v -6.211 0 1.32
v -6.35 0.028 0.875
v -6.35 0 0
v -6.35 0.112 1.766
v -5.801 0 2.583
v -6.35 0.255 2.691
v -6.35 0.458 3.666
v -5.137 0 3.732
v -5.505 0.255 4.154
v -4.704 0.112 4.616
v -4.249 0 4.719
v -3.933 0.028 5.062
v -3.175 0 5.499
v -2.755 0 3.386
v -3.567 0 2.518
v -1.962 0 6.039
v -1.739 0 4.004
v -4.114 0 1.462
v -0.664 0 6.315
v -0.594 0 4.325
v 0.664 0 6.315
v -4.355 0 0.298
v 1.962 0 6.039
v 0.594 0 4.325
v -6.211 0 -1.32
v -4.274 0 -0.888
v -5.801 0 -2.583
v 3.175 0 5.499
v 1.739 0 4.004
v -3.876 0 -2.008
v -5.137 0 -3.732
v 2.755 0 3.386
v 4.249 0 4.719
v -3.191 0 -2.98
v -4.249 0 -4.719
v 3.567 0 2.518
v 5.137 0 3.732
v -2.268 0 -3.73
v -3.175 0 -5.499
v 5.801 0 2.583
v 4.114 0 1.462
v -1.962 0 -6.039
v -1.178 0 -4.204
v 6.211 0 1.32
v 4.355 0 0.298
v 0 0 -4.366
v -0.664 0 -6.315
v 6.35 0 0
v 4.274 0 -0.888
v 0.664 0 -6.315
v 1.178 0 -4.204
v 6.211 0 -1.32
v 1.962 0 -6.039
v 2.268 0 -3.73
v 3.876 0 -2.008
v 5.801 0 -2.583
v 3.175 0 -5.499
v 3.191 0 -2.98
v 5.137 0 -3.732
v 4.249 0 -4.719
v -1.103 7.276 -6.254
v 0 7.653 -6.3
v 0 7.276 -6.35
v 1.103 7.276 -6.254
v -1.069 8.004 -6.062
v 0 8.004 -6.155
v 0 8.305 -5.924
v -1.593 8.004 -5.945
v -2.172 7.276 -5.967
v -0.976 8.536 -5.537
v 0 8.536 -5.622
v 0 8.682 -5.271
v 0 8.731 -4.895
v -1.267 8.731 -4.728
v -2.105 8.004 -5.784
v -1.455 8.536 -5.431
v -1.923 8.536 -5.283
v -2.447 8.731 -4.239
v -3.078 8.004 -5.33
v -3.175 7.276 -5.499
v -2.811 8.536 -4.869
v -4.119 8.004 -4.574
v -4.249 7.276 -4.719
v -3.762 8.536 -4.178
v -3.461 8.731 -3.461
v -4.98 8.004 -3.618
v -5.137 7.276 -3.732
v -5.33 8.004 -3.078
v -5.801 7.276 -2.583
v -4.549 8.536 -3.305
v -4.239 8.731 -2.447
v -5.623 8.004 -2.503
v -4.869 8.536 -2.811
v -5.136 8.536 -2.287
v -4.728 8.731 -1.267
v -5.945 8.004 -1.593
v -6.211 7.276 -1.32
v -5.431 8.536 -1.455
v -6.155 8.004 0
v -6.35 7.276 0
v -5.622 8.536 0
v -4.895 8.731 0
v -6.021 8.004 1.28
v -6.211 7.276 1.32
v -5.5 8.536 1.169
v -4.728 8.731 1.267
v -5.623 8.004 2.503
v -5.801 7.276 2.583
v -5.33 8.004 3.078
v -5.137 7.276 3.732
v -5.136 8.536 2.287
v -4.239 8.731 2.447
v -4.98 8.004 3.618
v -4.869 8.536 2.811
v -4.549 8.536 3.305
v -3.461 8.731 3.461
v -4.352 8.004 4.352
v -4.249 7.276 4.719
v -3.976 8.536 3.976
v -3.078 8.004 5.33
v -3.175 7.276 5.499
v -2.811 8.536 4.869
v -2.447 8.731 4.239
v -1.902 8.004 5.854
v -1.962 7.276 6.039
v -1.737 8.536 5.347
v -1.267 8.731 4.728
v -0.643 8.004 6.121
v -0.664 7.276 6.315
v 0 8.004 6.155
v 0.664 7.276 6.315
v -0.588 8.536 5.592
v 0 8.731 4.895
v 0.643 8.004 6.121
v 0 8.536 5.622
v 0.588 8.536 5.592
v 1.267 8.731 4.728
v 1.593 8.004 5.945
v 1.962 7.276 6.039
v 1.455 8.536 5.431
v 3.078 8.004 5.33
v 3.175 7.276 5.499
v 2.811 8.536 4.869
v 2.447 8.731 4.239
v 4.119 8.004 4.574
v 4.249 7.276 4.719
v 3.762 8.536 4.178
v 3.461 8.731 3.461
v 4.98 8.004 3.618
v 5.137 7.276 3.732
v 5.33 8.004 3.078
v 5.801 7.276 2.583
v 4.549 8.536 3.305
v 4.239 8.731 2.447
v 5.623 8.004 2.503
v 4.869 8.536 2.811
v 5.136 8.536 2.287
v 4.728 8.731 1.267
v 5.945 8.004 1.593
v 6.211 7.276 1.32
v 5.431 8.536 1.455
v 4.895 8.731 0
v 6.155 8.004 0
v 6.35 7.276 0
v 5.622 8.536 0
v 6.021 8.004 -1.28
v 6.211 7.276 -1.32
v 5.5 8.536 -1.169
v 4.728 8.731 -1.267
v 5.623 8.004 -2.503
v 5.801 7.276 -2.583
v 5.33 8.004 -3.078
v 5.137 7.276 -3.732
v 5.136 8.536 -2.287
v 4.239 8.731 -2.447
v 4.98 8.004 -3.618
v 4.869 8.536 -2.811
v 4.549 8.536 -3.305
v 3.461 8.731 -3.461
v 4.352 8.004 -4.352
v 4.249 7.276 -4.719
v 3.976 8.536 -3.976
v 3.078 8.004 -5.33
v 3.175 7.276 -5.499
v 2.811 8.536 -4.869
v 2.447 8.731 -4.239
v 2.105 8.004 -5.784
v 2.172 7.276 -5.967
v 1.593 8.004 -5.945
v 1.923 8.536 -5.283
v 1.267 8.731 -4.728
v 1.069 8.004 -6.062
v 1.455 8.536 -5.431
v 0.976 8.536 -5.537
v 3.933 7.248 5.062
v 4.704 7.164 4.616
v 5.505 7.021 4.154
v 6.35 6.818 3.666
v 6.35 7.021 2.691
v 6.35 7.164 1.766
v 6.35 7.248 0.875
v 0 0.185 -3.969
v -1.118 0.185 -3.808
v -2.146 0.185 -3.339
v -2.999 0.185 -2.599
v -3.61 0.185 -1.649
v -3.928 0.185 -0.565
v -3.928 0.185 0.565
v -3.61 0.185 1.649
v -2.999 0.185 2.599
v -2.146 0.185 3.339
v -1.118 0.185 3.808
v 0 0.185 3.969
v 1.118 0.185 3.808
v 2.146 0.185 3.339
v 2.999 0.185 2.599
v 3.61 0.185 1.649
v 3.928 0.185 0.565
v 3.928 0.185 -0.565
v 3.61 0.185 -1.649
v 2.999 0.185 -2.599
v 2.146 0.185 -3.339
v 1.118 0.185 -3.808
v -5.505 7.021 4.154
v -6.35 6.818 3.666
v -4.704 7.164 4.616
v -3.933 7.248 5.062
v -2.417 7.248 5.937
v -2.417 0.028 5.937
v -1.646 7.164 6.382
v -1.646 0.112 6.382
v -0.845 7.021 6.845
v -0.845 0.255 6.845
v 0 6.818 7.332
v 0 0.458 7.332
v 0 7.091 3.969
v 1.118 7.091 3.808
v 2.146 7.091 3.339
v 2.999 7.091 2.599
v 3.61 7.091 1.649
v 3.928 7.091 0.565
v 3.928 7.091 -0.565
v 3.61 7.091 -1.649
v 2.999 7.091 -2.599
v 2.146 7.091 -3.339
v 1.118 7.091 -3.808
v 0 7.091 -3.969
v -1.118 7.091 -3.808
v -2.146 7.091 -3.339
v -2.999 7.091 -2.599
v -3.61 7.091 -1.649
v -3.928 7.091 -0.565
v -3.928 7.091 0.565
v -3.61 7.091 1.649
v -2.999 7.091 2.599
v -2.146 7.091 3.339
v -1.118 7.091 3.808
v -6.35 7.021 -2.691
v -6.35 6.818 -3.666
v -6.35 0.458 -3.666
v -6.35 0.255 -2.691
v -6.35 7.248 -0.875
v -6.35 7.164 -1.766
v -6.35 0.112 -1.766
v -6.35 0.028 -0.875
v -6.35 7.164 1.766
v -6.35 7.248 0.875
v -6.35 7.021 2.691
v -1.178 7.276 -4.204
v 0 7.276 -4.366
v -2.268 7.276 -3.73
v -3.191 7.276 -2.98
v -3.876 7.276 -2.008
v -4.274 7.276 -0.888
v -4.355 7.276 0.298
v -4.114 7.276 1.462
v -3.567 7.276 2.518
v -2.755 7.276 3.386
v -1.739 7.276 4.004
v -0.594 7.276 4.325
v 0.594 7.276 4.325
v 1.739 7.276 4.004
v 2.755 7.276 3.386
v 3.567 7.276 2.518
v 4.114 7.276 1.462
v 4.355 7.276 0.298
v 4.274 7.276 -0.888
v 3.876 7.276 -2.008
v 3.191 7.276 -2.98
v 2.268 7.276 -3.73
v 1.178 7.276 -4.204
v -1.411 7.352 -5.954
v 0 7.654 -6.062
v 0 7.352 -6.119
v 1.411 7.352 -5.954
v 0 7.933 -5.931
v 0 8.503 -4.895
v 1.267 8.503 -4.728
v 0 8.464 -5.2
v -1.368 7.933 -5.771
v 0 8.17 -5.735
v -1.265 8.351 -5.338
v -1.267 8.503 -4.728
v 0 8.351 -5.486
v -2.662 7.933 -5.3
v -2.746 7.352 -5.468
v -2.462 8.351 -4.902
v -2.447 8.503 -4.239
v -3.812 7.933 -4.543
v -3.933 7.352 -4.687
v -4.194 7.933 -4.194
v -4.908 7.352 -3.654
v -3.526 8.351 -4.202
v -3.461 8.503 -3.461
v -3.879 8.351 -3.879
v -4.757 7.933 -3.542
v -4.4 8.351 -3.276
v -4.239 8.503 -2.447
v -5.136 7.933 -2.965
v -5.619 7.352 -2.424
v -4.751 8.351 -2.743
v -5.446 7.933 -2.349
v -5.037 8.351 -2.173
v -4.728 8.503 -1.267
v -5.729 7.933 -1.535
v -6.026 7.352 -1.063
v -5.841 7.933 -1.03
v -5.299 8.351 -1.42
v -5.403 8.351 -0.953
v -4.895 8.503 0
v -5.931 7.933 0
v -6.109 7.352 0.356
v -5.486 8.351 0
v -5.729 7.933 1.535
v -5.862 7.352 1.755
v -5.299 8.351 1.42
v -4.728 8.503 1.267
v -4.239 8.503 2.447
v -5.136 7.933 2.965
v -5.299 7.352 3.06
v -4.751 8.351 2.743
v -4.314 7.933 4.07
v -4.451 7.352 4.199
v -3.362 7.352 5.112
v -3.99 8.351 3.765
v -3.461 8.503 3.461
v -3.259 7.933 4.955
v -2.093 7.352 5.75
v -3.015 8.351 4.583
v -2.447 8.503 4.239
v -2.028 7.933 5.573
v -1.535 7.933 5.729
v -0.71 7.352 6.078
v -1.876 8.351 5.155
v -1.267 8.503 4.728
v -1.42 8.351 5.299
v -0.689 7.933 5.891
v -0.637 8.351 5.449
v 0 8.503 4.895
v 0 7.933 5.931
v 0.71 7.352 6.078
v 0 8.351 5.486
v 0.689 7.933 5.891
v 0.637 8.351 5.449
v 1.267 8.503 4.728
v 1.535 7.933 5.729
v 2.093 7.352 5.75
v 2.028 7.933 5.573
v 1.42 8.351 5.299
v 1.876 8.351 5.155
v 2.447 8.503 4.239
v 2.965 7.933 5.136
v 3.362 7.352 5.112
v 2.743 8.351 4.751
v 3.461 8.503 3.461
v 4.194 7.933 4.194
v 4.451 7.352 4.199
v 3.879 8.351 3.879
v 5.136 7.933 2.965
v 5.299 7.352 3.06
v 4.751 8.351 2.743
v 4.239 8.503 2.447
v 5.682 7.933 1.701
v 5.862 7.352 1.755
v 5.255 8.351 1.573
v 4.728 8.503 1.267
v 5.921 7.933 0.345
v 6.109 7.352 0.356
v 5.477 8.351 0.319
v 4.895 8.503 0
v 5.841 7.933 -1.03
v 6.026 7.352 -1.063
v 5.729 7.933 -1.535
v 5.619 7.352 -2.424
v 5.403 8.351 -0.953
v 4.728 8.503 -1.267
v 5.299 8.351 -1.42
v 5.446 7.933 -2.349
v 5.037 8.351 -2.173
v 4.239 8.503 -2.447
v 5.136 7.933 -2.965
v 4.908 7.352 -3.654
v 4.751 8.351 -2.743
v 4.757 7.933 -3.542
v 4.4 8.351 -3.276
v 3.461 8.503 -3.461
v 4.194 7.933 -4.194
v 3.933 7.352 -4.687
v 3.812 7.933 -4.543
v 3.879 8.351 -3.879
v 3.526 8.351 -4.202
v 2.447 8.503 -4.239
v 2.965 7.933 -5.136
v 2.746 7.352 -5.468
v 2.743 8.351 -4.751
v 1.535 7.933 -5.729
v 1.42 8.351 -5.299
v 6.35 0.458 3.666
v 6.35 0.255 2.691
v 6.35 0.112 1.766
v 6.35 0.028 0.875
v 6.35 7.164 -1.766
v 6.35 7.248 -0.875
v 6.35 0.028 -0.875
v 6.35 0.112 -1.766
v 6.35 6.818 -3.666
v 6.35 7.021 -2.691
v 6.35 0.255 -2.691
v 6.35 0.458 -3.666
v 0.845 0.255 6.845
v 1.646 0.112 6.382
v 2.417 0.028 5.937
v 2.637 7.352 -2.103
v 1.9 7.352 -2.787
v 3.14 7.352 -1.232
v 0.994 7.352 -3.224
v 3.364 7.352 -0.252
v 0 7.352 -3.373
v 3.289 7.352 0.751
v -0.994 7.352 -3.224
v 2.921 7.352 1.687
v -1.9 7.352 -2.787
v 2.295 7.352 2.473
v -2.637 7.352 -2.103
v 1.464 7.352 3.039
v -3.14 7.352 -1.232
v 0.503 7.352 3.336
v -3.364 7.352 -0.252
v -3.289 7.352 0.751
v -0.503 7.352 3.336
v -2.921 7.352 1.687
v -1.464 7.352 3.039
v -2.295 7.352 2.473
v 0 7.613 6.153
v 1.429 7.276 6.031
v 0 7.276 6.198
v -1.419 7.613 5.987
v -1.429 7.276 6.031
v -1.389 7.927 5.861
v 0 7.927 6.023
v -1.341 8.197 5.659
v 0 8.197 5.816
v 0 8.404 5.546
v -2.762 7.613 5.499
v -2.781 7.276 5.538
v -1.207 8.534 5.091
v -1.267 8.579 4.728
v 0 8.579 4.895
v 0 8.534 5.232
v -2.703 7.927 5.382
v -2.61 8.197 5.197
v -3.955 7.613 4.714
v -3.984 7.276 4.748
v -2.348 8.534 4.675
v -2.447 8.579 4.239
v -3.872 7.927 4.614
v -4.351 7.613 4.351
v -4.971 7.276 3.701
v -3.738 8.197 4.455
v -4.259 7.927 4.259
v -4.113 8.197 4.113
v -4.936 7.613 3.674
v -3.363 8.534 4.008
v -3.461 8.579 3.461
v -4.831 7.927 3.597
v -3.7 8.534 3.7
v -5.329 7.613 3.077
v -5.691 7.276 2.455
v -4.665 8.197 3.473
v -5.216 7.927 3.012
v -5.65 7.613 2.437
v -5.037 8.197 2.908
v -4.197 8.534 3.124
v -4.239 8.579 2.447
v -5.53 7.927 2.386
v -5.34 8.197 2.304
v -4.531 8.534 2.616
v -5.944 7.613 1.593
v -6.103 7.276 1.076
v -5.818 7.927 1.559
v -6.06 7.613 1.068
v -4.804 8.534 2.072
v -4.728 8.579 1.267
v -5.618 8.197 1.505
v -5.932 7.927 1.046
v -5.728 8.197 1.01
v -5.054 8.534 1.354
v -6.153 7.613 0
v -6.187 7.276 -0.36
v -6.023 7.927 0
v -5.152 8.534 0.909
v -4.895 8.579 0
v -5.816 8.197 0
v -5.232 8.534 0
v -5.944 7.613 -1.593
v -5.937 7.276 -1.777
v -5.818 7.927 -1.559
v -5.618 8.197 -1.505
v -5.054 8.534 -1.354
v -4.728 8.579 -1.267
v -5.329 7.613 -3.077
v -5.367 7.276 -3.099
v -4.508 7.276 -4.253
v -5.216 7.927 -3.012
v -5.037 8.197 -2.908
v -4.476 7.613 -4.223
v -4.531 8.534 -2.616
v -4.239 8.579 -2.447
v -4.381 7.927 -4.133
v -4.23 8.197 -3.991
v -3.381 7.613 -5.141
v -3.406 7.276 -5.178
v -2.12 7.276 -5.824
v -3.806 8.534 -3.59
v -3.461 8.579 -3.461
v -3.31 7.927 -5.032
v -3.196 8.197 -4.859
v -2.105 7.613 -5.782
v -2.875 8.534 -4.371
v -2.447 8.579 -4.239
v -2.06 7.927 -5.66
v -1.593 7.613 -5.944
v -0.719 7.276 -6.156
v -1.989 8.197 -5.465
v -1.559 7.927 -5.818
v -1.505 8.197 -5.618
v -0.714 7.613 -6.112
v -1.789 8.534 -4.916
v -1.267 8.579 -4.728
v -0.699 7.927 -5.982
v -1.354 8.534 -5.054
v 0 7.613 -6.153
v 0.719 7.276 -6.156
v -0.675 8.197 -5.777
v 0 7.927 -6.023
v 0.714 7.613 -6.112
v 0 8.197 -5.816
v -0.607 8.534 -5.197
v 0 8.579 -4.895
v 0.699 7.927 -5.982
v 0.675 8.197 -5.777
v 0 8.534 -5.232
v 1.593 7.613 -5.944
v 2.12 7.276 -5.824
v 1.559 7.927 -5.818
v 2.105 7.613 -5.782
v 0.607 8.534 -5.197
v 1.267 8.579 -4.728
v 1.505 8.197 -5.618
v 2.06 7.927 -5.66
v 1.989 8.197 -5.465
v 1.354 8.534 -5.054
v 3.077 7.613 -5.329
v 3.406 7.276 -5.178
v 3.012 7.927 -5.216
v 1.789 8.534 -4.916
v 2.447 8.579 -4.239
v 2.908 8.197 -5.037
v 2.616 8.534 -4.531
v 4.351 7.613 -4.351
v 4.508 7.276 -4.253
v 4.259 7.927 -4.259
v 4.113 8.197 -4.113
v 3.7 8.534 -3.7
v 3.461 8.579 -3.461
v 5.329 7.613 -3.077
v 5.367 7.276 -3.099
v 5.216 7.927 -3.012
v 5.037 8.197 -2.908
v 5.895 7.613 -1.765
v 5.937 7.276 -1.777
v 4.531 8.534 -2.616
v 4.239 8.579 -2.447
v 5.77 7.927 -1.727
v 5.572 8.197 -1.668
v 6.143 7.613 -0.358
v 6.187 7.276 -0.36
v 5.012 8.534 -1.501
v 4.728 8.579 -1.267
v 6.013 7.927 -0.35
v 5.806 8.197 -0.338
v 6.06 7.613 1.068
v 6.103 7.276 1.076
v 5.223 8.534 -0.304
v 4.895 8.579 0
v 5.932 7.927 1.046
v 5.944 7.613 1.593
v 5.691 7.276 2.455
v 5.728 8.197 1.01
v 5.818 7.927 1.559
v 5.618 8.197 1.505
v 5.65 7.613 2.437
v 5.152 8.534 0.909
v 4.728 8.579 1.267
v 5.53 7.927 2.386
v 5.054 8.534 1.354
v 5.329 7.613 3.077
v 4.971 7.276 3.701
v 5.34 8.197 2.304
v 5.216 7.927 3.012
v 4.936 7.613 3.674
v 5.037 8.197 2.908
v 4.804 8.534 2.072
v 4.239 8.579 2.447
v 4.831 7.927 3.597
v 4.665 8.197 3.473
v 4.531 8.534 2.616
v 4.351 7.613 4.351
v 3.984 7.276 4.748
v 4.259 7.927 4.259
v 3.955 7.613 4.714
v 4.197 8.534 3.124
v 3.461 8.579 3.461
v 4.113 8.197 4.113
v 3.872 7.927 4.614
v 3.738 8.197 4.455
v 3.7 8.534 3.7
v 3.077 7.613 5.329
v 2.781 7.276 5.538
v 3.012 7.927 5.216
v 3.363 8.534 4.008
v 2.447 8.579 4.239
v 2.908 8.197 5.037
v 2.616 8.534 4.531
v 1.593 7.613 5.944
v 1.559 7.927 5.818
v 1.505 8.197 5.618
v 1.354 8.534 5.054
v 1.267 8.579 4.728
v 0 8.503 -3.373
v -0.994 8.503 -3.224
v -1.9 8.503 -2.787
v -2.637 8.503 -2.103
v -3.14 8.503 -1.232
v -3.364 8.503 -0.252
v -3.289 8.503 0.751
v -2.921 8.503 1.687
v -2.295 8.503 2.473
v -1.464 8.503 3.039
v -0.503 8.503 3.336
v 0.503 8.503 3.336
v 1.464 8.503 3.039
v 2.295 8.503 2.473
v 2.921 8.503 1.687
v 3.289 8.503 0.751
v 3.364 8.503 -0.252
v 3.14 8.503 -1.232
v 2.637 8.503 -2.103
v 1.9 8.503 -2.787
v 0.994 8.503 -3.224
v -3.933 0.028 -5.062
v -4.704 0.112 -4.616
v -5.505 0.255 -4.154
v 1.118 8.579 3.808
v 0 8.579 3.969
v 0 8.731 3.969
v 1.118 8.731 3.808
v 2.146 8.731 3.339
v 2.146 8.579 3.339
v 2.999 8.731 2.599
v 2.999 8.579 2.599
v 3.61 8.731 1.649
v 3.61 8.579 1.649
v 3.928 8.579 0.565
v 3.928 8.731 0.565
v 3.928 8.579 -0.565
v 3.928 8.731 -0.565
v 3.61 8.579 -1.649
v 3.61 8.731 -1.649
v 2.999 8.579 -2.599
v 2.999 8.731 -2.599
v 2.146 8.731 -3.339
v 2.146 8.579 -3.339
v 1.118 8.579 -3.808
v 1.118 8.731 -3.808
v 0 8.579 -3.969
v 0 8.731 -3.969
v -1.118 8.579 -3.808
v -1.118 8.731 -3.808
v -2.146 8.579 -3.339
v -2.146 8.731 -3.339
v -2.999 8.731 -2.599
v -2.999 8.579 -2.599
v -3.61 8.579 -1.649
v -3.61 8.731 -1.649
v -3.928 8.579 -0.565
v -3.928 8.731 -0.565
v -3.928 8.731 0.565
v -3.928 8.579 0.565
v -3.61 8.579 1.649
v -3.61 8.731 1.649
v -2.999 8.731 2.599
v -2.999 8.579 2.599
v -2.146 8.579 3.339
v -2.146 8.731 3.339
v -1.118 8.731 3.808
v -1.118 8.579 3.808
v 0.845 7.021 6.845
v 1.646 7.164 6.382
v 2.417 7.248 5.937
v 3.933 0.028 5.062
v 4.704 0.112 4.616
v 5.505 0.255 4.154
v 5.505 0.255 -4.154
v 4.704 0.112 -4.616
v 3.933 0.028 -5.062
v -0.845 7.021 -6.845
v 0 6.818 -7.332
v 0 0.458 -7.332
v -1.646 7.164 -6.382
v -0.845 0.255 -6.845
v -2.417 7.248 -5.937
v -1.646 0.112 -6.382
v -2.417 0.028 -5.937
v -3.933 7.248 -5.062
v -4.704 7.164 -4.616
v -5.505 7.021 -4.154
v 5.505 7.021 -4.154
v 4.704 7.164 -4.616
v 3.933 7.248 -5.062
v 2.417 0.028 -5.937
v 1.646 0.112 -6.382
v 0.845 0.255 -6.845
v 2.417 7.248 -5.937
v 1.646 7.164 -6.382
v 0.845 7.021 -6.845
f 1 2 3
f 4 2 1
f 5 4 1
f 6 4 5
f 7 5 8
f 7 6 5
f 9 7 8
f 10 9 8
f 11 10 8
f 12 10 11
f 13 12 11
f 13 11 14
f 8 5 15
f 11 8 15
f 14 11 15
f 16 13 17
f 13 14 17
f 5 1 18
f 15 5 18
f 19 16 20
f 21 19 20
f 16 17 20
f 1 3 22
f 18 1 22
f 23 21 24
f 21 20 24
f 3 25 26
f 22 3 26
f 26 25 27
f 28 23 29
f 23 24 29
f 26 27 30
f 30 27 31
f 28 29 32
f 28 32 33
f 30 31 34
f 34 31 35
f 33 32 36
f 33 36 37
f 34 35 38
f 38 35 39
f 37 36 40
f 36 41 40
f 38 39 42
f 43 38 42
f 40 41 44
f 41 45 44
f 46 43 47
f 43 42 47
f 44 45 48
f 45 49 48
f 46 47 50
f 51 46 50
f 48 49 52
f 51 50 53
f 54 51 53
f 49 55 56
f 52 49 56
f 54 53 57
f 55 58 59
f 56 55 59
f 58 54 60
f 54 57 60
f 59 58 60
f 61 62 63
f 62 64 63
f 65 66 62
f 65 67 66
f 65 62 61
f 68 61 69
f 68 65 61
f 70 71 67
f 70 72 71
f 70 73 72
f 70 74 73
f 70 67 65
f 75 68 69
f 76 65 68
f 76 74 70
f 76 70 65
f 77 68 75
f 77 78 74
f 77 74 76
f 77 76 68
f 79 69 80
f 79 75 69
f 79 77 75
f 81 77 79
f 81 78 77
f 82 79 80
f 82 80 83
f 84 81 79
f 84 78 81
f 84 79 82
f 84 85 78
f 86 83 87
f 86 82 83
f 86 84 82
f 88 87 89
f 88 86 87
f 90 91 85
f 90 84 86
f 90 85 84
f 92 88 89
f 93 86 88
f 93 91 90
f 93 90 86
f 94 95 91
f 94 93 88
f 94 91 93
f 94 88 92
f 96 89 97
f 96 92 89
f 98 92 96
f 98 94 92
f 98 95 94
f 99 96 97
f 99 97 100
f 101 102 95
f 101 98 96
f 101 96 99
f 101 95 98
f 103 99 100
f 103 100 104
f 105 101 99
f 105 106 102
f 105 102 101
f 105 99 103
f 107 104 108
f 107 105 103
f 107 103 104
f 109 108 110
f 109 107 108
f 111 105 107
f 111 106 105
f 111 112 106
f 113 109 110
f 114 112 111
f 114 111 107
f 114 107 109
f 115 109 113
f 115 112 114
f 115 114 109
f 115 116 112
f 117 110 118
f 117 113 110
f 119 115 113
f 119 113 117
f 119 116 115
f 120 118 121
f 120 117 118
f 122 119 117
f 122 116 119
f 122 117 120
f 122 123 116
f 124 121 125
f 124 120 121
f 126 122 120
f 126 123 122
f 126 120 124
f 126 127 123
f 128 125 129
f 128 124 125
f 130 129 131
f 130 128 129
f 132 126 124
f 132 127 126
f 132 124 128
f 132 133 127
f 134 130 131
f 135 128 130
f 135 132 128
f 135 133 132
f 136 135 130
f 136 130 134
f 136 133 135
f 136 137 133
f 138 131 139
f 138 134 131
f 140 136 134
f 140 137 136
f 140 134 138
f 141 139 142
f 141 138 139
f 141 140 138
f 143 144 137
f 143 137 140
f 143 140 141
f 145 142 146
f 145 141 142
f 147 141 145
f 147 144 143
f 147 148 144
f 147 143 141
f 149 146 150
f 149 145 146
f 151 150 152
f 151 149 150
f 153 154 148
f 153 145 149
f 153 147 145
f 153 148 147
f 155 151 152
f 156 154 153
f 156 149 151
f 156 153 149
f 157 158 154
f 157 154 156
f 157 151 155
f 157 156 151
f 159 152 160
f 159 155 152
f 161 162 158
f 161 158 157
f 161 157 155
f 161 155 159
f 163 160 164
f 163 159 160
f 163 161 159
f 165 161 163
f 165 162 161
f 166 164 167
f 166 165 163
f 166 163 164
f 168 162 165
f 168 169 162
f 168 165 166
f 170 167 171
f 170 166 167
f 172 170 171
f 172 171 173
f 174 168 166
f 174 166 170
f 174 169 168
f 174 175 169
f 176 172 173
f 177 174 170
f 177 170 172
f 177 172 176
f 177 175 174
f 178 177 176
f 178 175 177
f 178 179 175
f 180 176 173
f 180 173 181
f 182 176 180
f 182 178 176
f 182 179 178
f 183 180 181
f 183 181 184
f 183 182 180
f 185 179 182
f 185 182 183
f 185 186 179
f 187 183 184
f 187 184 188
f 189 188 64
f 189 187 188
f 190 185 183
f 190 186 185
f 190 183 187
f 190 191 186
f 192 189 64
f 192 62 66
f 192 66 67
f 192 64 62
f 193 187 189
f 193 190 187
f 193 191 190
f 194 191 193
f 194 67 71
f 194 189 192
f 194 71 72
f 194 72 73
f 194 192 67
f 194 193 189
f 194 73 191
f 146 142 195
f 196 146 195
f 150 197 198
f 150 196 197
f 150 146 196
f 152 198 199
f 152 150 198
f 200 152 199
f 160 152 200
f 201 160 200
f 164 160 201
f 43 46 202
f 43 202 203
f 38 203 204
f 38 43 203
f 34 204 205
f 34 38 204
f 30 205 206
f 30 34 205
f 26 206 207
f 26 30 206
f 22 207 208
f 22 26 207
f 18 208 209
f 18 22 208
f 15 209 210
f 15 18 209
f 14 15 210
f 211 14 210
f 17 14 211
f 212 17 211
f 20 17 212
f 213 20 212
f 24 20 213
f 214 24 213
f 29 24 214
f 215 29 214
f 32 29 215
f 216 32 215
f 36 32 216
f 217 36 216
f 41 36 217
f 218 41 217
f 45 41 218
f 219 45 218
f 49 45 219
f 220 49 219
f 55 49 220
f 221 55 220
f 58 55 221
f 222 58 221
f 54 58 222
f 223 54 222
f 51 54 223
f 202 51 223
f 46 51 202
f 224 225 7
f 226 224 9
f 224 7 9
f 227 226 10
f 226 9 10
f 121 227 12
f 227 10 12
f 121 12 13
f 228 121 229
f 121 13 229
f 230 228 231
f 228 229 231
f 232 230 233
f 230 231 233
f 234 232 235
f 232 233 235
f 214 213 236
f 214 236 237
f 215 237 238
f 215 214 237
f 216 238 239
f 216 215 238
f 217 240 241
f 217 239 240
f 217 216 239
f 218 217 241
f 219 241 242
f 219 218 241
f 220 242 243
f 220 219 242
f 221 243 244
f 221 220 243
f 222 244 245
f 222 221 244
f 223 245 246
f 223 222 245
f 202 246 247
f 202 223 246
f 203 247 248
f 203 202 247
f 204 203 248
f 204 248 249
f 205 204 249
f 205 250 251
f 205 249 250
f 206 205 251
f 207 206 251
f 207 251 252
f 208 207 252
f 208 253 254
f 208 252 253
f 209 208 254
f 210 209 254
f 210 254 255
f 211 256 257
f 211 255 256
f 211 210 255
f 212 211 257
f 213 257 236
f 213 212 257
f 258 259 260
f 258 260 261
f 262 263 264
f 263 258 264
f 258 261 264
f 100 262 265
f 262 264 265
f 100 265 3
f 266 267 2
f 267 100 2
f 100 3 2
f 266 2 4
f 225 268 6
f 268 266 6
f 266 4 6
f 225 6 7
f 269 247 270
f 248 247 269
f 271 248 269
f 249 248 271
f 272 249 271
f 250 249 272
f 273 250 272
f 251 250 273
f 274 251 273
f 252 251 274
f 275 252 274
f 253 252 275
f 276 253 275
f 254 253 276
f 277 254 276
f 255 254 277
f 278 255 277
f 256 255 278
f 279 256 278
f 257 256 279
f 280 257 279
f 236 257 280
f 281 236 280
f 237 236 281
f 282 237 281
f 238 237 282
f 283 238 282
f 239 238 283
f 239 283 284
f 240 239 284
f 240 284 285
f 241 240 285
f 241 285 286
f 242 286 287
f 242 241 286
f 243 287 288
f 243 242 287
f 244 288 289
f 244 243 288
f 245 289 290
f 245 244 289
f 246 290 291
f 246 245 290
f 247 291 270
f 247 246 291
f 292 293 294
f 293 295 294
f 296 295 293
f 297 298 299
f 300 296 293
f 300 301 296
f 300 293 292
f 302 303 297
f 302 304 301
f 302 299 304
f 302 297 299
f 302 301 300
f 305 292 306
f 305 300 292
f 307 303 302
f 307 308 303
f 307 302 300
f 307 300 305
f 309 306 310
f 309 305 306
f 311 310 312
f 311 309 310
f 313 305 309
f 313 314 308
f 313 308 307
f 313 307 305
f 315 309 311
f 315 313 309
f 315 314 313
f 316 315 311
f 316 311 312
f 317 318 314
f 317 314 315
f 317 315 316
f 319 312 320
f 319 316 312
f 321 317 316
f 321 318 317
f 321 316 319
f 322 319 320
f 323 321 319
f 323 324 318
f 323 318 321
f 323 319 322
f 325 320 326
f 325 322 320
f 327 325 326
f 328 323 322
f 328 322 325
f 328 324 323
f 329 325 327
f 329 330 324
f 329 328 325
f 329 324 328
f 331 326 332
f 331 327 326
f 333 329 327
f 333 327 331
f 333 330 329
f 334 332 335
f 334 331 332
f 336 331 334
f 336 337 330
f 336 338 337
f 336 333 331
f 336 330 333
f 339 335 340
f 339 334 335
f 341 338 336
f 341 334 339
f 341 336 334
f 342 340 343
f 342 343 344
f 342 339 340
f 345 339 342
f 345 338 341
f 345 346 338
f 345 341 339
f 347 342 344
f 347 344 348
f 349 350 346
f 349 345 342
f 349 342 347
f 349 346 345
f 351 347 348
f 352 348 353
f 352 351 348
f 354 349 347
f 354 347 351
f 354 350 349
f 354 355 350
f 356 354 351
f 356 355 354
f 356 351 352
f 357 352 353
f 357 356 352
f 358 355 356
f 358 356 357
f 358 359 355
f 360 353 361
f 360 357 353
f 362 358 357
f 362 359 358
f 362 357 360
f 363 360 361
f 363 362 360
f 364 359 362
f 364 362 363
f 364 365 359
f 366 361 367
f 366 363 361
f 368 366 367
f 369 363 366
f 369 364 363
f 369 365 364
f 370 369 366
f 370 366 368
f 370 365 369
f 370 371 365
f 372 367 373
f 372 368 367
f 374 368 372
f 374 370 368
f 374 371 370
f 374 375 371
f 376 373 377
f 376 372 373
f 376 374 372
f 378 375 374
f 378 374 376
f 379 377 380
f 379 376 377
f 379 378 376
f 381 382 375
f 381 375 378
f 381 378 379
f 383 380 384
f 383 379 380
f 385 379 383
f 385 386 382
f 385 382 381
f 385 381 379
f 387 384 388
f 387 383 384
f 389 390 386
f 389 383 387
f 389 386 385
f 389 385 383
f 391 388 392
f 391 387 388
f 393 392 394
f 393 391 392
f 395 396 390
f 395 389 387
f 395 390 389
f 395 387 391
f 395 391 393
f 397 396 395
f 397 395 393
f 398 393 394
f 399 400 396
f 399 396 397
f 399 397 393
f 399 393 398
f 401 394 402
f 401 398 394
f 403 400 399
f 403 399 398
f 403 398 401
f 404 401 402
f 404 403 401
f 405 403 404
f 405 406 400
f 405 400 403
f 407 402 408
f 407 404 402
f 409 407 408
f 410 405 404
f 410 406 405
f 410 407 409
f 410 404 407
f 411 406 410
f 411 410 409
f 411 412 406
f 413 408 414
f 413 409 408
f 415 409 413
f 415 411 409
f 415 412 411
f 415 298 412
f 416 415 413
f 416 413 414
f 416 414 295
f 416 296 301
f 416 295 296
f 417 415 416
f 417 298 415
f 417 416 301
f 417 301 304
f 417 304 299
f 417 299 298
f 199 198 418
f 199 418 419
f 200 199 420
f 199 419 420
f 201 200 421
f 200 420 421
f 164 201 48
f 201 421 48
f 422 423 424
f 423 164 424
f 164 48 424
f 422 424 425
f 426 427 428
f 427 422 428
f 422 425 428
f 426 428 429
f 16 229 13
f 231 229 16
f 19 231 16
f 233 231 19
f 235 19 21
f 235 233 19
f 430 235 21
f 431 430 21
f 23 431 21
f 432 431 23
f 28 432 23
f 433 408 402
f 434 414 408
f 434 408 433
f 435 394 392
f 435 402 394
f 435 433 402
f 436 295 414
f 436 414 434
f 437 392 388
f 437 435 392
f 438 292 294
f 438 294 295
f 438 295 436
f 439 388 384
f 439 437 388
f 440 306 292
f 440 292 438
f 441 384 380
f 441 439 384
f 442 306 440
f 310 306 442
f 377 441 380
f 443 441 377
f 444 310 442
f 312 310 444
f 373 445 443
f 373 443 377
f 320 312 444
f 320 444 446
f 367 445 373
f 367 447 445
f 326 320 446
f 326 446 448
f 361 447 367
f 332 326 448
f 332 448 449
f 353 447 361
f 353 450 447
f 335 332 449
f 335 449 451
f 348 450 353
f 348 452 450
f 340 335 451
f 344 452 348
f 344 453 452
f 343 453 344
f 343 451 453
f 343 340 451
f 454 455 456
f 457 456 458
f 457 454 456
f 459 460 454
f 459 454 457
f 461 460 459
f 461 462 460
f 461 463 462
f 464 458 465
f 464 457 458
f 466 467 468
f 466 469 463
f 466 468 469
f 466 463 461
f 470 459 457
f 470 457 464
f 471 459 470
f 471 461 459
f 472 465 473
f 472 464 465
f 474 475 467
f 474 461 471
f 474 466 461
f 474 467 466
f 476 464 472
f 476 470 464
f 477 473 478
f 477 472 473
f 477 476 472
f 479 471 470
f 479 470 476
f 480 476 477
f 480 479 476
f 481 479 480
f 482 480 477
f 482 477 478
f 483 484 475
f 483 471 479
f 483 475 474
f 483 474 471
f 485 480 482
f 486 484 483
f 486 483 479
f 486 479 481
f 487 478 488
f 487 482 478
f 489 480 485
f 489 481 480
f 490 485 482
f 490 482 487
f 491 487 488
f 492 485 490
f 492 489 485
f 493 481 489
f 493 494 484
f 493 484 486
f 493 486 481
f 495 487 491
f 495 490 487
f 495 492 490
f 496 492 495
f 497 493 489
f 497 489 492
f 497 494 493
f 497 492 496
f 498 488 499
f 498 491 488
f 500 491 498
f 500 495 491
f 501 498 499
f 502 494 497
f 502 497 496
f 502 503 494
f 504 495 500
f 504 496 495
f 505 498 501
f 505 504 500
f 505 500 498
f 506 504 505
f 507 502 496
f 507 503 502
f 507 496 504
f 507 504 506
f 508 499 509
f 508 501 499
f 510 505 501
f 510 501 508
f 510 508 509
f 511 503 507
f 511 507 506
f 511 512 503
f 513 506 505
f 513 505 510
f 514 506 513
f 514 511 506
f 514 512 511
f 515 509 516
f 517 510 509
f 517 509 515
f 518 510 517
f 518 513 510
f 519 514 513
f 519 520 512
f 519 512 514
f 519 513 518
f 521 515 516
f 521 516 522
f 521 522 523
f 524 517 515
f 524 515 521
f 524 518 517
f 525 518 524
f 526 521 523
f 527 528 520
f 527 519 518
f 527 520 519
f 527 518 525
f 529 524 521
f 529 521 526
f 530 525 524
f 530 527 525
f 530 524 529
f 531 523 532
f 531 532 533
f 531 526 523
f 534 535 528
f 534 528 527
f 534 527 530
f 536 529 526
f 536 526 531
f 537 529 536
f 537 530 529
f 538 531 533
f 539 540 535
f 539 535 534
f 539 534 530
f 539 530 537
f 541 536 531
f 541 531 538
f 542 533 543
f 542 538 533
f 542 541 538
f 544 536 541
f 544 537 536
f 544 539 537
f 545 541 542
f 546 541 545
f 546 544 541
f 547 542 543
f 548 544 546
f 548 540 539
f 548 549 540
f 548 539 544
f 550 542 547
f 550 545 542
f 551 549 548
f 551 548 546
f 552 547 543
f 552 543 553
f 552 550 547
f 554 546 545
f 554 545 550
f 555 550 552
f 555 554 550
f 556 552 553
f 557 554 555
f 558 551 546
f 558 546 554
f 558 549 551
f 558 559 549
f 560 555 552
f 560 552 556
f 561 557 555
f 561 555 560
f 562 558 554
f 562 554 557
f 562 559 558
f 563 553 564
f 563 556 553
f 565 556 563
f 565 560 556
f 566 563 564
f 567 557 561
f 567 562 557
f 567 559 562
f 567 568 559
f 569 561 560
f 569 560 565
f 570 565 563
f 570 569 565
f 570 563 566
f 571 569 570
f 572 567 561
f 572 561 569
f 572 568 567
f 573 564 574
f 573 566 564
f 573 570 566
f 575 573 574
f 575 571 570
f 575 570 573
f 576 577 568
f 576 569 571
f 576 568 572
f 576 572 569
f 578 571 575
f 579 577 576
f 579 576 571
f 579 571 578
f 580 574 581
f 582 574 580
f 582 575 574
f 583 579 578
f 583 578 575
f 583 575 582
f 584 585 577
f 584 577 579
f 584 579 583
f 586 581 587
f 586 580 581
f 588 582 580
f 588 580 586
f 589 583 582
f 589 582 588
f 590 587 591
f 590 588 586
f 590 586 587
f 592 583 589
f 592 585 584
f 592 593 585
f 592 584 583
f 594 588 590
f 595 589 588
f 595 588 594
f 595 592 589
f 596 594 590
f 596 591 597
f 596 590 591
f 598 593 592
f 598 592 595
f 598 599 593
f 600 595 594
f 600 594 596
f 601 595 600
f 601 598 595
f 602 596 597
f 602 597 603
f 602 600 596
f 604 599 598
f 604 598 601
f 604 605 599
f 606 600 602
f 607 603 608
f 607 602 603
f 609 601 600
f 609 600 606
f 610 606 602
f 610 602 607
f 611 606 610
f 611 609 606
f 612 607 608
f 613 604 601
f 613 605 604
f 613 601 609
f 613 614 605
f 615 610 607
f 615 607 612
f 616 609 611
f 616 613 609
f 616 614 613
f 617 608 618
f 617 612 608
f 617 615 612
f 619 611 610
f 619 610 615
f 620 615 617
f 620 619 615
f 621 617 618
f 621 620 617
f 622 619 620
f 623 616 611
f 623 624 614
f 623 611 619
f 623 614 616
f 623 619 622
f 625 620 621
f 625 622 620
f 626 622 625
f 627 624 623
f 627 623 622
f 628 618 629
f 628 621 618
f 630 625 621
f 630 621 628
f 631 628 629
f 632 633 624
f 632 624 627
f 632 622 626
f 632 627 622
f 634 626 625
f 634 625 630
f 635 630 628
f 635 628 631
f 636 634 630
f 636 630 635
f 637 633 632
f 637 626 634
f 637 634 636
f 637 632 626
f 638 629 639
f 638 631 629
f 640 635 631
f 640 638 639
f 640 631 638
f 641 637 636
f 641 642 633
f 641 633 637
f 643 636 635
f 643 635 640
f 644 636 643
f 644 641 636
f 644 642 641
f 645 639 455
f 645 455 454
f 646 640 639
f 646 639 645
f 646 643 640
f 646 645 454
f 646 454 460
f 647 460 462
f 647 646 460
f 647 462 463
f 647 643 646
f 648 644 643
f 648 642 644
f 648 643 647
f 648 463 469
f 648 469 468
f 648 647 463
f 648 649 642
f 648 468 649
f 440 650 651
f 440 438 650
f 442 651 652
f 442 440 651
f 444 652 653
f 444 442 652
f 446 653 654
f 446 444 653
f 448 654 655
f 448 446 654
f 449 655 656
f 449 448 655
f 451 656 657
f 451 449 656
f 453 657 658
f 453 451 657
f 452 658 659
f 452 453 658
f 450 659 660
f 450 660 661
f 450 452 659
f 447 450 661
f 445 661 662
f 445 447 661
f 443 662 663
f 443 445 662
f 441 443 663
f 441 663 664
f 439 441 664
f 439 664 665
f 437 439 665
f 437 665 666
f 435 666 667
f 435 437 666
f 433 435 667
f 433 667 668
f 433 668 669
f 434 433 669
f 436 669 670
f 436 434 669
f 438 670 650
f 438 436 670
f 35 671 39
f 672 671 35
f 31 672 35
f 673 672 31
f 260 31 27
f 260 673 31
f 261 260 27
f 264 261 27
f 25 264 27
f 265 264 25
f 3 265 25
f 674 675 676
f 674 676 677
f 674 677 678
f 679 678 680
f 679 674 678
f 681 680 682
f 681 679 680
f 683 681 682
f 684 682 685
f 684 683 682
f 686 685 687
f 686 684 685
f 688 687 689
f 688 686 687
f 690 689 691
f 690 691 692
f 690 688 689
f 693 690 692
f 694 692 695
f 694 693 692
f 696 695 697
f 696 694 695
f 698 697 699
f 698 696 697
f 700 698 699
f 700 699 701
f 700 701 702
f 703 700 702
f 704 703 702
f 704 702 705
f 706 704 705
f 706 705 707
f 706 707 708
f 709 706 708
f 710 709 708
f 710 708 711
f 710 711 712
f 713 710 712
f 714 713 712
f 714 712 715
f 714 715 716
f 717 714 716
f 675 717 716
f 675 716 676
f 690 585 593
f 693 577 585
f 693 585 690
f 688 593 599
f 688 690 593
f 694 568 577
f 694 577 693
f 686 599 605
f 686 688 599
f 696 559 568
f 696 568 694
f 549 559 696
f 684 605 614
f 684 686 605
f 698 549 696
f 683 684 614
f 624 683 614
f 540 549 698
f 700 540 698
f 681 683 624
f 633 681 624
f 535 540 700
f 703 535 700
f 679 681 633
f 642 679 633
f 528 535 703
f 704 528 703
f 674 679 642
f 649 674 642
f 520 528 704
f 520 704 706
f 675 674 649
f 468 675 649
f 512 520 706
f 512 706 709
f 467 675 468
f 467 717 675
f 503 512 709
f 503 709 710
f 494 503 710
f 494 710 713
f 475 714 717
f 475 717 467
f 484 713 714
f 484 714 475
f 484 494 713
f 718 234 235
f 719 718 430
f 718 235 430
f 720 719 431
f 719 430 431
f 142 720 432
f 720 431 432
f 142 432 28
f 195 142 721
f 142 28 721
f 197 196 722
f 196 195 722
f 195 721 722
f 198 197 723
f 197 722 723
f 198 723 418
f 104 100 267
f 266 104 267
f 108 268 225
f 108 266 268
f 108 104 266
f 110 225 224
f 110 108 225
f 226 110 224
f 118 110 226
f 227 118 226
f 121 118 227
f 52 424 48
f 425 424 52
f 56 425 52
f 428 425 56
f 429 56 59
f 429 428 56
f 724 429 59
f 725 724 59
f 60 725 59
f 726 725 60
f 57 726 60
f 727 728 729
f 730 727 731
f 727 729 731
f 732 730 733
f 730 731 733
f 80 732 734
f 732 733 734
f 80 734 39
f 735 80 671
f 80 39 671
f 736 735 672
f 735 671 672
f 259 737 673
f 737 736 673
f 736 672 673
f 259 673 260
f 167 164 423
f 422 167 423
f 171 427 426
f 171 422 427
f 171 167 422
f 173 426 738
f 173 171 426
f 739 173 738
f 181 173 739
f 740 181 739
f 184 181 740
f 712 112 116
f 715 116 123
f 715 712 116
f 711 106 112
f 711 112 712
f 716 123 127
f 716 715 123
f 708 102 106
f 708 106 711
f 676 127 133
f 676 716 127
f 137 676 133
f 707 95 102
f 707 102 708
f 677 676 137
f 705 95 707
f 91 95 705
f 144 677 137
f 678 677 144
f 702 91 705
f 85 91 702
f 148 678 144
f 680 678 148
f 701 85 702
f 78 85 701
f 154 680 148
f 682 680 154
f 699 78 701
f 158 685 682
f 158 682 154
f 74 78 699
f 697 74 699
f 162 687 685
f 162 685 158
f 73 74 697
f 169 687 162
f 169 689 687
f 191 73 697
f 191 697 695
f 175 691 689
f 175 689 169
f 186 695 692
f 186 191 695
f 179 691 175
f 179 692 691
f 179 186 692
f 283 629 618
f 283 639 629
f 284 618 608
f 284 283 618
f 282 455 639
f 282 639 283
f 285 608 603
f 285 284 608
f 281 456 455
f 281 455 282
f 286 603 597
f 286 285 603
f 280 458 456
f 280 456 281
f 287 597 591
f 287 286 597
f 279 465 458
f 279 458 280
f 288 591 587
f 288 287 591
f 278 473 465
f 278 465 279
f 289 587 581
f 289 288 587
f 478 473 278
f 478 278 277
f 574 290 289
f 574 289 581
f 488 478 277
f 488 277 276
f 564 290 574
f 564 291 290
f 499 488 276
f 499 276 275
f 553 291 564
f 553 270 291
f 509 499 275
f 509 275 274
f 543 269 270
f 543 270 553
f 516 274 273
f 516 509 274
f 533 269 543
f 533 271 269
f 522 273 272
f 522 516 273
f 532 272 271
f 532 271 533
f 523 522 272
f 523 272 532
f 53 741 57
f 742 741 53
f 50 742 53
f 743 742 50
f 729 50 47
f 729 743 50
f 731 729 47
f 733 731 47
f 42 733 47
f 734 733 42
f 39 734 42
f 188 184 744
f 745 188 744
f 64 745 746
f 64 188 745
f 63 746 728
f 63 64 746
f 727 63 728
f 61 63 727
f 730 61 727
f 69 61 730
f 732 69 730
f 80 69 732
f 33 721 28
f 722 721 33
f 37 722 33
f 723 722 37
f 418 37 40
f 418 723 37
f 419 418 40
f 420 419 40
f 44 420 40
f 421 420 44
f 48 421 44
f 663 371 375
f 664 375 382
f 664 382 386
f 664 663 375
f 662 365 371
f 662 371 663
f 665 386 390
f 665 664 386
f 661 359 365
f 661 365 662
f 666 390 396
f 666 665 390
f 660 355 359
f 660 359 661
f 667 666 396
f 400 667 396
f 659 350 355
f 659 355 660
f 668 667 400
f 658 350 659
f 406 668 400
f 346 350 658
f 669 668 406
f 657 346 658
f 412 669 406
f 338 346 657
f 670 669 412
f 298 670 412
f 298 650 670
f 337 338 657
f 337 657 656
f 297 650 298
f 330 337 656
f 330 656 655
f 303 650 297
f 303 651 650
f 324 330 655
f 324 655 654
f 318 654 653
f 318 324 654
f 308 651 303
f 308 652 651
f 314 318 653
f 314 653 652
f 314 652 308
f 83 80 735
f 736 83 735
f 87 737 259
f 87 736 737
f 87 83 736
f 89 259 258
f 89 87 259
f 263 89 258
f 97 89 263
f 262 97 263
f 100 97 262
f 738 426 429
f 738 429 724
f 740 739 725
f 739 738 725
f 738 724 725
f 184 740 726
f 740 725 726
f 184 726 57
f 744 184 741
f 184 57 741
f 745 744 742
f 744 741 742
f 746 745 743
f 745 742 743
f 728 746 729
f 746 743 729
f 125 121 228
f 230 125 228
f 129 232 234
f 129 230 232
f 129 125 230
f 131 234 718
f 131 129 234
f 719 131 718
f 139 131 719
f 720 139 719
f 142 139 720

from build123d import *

# Parameters (mm, degrees)
SKETCH13_R     = 3.96875
EXTRUDE1_DEPTH = 8.73125


with BuildPart() as part:
    # Sketch13 → Extrude1 (new body)
    with BuildSketch(Plane(origin=(0, 0, 0), x_dir=(1, 0, 0), z_dir=(0, 1, 0))):
        Polygon((0, 7.332348419), (-6.35, 3.666174209), (-6.35, -3.666174209), (0, -7.332348419), (6.35, -3.666174209), (6.35, 3.666174209), align=None)
        with Locations(Location((0, 0, 0), (0, 0, 270))):
            Circle(SKETCH13_R, mode=Mode.SUBTRACT)
    extrude(amount=EXTRUDE1_DEPTH)

    # Sketch5 → Cut-Revolve3 (revolve, cut)
    with BuildSketch(Plane(origin=(0, 0, 0), x_dir=(0, 0, -1), z_dir=(1, 0, 0))):
        with BuildLine():
            Line((0, 0), (6.35, 0))
            Line((6.35, 0), (7.332348419, 0.458076591))
            Line((7.332348419, 0.458076591), (7.332348419, 6.817965076))
            Line((7.332348419, 6.817965076), (6.35, 7.276041667))
            ThreePointArc((6.35, 7.276041667), (5.923779347, 8.305029347), (4.894791667, 8.73125))
            Line((4.894791667, 8.73125), (4.894791667, 10.00125))
            Line((4.894791667, 10.00125), (8.602348419, 10.00125))
            Line((8.602348419, 10.00125), (8.602348419, -1.27))
            Line((8.602348419, -1.27), (0, -1.27))
            Line((0, -1.27), (0, 0))
        make_face()
    revolve(axis=Axis((0, 0, 0), (0, 1, 0)), mode=Mode.SUBTRACT)

    # Sketch6 → Cut-Revolve4 (revolve, cut)
    with BuildSketch(Plane(origin=(0, 0, 0), x_dir=(0, 0, -1), z_dir=(1, 0, 0)), mode=Mode.PRIVATE) as cut_revolve4_sk:
        with BuildLine():
            Line((0, 7.276041667), (6.1976, 7.276041667))
            ThreePointArc((6.1976, 7.276041667), (5.816016274, 8.197266274), (4.894791667, 8.57885))
            Line((4.894791667, 8.57885), (2.447395833, 8.57885))
            Line((2.447395833, 8.57885), (2.447395833, 10.00125))
            Line((2.447395833, 10.00125), (0, 10.00125))
            Line((0, 10.00125), (0, 7.276041667))
        make_face()
    revolve(cut_revolve4_sk.sketch.rotate(Axis((0, 10.00125, 0), (0, -1, 0)), 180), axis=Axis((0, 10.00125, 0), (0, -1, 0)), mode=Mode.SUBTRACT)

    # Sketch4 → Cut-Revolve2 (revolve, cut)
    with BuildSketch(Plane(origin=(0, 0, 0), x_dir=(0, 0, -1), z_dir=(1, 0, 0))):
        Polygon((0, 7.276041667), (4.365625, 7.276041667), (0, 5.240317297), align=None)
        Polygon((0, 2.03572437), (4.365625, 0), (0, 0), align=None)
    revolve(axis=Axis((0, 0, 0), (0, 1, 0)), mode=Mode.SUBTRACT)


with BuildPart() as body_2:
    # Sketch7 → Revolve2 (revolve)
    with BuildSketch(Plane(origin=(0, 0, 0), x_dir=(0, 0, -1), z_dir=(1, 0, 0))):
        with BuildLine():
            Line((3.3734375, 7.352241667), (6.119030844, 7.352241667))
            ThreePointArc((6.119030844, 7.352241667), (5.734762038, 8.169919611), (4.894791667, 8.50265))
            Line((4.894791667, 8.50265), (3.3734375, 8.50265))
            Line((3.3734375, 8.50265), (3.3734375, 7.352241667))
        make_face()
    revolve(axis=Axis((0, 7.352241667, 0), (0, 1, 0)))


solid = Compound([part.part, body_2.part])
